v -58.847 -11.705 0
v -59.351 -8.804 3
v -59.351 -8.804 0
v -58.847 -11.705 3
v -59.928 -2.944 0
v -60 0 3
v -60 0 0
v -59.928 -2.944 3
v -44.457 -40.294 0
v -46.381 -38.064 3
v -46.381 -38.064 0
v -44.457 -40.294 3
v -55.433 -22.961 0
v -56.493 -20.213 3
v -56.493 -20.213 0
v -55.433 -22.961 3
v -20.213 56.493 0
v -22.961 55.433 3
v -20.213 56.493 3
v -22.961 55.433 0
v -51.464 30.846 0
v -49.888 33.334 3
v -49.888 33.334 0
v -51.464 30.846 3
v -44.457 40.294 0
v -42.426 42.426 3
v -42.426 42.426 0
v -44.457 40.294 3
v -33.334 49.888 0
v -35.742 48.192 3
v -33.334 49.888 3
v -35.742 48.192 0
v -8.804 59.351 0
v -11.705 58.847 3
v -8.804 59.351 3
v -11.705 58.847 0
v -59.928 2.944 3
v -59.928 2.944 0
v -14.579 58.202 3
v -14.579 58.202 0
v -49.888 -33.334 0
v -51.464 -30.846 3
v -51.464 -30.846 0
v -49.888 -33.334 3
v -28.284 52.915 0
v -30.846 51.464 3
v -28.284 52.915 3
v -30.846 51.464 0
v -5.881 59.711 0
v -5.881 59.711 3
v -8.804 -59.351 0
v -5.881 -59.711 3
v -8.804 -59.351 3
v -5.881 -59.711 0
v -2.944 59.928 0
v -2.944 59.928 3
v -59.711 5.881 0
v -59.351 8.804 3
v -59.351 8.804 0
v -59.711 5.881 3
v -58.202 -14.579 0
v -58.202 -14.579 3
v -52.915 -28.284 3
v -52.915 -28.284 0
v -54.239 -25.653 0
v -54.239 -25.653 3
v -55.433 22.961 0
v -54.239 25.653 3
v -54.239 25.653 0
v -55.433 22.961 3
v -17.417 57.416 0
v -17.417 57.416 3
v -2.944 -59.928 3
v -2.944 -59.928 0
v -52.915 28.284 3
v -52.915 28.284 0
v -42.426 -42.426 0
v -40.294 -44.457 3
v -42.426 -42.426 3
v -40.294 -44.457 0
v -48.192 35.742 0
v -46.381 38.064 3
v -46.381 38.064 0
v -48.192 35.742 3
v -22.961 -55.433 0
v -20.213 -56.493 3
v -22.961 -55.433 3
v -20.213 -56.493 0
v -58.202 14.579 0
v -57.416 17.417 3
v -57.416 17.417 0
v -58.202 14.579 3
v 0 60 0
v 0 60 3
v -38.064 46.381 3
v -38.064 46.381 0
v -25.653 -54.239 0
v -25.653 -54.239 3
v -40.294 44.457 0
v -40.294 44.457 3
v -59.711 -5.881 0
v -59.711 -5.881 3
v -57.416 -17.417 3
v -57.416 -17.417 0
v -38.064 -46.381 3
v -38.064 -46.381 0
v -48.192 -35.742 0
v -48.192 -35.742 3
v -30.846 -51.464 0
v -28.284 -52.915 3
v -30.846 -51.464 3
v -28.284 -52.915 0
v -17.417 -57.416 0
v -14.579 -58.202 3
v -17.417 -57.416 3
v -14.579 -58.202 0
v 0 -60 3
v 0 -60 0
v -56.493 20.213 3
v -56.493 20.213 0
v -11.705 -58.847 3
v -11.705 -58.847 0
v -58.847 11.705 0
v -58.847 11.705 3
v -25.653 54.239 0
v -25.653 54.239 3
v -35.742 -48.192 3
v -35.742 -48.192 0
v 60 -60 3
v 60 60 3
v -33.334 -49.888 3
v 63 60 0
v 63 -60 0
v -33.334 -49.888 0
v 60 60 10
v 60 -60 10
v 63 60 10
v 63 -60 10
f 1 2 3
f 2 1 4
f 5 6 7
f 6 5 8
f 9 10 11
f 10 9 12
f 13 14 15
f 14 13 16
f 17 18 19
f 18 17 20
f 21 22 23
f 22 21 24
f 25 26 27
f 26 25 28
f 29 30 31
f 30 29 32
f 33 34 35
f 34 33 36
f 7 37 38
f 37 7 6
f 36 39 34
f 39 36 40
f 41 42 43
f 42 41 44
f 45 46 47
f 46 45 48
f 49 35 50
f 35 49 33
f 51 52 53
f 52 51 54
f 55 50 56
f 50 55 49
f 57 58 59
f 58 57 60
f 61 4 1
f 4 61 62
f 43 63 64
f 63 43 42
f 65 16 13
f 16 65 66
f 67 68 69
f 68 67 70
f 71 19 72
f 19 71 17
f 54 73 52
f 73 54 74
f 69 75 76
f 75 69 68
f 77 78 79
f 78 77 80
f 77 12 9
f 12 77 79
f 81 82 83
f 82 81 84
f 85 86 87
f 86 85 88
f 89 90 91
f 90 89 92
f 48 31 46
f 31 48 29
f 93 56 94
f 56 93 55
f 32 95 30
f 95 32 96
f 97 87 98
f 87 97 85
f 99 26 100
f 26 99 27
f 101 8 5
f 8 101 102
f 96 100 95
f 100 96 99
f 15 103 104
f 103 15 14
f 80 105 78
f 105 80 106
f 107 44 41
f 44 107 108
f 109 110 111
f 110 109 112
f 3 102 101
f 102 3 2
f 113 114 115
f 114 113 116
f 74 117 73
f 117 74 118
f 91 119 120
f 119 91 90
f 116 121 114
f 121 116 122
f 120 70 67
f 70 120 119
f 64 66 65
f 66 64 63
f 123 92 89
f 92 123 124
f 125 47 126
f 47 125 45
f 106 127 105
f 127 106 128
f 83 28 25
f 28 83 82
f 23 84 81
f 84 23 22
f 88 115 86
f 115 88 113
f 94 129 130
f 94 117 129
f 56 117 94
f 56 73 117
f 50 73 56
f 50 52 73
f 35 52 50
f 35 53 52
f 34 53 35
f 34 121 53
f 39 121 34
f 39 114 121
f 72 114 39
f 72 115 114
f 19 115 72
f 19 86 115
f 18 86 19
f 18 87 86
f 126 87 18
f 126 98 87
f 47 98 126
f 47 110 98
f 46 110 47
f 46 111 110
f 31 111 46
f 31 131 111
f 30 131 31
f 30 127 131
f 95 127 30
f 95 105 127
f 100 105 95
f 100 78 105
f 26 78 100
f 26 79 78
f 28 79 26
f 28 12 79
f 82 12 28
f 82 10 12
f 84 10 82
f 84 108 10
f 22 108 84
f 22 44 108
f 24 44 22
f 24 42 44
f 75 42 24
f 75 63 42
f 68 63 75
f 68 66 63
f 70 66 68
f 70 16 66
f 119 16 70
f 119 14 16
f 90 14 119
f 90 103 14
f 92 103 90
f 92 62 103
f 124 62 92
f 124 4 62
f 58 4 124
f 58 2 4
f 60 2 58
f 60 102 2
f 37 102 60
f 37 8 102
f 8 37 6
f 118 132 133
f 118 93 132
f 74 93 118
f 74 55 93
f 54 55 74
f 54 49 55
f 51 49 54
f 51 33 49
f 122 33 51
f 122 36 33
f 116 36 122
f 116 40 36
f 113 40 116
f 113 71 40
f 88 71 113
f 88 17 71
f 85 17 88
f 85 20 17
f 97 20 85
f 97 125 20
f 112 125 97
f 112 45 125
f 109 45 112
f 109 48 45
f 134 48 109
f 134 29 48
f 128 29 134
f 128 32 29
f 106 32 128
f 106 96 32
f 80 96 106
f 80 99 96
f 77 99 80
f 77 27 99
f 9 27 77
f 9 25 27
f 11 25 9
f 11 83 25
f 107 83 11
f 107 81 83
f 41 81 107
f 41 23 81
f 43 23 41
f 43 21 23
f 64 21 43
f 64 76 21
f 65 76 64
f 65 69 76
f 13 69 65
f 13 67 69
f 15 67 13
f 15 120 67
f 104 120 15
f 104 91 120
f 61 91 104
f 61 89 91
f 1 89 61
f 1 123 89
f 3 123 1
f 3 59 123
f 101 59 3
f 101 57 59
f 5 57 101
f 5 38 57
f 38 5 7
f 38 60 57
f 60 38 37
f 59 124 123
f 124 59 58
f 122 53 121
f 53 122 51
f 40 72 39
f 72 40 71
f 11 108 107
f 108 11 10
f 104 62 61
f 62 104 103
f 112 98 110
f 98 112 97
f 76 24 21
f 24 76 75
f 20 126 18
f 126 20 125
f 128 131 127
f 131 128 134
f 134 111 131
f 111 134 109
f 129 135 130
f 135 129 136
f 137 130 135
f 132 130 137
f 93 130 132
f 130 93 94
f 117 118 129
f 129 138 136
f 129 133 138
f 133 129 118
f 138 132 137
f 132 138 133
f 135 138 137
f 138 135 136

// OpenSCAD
$fn=128;
r=60;
t=3;

cylinder(r=r,h=t);
translate([0,-r,0]) cube([r,r*2,t]);
translate([r,-r,0]) cube([t,r*2,10]);
